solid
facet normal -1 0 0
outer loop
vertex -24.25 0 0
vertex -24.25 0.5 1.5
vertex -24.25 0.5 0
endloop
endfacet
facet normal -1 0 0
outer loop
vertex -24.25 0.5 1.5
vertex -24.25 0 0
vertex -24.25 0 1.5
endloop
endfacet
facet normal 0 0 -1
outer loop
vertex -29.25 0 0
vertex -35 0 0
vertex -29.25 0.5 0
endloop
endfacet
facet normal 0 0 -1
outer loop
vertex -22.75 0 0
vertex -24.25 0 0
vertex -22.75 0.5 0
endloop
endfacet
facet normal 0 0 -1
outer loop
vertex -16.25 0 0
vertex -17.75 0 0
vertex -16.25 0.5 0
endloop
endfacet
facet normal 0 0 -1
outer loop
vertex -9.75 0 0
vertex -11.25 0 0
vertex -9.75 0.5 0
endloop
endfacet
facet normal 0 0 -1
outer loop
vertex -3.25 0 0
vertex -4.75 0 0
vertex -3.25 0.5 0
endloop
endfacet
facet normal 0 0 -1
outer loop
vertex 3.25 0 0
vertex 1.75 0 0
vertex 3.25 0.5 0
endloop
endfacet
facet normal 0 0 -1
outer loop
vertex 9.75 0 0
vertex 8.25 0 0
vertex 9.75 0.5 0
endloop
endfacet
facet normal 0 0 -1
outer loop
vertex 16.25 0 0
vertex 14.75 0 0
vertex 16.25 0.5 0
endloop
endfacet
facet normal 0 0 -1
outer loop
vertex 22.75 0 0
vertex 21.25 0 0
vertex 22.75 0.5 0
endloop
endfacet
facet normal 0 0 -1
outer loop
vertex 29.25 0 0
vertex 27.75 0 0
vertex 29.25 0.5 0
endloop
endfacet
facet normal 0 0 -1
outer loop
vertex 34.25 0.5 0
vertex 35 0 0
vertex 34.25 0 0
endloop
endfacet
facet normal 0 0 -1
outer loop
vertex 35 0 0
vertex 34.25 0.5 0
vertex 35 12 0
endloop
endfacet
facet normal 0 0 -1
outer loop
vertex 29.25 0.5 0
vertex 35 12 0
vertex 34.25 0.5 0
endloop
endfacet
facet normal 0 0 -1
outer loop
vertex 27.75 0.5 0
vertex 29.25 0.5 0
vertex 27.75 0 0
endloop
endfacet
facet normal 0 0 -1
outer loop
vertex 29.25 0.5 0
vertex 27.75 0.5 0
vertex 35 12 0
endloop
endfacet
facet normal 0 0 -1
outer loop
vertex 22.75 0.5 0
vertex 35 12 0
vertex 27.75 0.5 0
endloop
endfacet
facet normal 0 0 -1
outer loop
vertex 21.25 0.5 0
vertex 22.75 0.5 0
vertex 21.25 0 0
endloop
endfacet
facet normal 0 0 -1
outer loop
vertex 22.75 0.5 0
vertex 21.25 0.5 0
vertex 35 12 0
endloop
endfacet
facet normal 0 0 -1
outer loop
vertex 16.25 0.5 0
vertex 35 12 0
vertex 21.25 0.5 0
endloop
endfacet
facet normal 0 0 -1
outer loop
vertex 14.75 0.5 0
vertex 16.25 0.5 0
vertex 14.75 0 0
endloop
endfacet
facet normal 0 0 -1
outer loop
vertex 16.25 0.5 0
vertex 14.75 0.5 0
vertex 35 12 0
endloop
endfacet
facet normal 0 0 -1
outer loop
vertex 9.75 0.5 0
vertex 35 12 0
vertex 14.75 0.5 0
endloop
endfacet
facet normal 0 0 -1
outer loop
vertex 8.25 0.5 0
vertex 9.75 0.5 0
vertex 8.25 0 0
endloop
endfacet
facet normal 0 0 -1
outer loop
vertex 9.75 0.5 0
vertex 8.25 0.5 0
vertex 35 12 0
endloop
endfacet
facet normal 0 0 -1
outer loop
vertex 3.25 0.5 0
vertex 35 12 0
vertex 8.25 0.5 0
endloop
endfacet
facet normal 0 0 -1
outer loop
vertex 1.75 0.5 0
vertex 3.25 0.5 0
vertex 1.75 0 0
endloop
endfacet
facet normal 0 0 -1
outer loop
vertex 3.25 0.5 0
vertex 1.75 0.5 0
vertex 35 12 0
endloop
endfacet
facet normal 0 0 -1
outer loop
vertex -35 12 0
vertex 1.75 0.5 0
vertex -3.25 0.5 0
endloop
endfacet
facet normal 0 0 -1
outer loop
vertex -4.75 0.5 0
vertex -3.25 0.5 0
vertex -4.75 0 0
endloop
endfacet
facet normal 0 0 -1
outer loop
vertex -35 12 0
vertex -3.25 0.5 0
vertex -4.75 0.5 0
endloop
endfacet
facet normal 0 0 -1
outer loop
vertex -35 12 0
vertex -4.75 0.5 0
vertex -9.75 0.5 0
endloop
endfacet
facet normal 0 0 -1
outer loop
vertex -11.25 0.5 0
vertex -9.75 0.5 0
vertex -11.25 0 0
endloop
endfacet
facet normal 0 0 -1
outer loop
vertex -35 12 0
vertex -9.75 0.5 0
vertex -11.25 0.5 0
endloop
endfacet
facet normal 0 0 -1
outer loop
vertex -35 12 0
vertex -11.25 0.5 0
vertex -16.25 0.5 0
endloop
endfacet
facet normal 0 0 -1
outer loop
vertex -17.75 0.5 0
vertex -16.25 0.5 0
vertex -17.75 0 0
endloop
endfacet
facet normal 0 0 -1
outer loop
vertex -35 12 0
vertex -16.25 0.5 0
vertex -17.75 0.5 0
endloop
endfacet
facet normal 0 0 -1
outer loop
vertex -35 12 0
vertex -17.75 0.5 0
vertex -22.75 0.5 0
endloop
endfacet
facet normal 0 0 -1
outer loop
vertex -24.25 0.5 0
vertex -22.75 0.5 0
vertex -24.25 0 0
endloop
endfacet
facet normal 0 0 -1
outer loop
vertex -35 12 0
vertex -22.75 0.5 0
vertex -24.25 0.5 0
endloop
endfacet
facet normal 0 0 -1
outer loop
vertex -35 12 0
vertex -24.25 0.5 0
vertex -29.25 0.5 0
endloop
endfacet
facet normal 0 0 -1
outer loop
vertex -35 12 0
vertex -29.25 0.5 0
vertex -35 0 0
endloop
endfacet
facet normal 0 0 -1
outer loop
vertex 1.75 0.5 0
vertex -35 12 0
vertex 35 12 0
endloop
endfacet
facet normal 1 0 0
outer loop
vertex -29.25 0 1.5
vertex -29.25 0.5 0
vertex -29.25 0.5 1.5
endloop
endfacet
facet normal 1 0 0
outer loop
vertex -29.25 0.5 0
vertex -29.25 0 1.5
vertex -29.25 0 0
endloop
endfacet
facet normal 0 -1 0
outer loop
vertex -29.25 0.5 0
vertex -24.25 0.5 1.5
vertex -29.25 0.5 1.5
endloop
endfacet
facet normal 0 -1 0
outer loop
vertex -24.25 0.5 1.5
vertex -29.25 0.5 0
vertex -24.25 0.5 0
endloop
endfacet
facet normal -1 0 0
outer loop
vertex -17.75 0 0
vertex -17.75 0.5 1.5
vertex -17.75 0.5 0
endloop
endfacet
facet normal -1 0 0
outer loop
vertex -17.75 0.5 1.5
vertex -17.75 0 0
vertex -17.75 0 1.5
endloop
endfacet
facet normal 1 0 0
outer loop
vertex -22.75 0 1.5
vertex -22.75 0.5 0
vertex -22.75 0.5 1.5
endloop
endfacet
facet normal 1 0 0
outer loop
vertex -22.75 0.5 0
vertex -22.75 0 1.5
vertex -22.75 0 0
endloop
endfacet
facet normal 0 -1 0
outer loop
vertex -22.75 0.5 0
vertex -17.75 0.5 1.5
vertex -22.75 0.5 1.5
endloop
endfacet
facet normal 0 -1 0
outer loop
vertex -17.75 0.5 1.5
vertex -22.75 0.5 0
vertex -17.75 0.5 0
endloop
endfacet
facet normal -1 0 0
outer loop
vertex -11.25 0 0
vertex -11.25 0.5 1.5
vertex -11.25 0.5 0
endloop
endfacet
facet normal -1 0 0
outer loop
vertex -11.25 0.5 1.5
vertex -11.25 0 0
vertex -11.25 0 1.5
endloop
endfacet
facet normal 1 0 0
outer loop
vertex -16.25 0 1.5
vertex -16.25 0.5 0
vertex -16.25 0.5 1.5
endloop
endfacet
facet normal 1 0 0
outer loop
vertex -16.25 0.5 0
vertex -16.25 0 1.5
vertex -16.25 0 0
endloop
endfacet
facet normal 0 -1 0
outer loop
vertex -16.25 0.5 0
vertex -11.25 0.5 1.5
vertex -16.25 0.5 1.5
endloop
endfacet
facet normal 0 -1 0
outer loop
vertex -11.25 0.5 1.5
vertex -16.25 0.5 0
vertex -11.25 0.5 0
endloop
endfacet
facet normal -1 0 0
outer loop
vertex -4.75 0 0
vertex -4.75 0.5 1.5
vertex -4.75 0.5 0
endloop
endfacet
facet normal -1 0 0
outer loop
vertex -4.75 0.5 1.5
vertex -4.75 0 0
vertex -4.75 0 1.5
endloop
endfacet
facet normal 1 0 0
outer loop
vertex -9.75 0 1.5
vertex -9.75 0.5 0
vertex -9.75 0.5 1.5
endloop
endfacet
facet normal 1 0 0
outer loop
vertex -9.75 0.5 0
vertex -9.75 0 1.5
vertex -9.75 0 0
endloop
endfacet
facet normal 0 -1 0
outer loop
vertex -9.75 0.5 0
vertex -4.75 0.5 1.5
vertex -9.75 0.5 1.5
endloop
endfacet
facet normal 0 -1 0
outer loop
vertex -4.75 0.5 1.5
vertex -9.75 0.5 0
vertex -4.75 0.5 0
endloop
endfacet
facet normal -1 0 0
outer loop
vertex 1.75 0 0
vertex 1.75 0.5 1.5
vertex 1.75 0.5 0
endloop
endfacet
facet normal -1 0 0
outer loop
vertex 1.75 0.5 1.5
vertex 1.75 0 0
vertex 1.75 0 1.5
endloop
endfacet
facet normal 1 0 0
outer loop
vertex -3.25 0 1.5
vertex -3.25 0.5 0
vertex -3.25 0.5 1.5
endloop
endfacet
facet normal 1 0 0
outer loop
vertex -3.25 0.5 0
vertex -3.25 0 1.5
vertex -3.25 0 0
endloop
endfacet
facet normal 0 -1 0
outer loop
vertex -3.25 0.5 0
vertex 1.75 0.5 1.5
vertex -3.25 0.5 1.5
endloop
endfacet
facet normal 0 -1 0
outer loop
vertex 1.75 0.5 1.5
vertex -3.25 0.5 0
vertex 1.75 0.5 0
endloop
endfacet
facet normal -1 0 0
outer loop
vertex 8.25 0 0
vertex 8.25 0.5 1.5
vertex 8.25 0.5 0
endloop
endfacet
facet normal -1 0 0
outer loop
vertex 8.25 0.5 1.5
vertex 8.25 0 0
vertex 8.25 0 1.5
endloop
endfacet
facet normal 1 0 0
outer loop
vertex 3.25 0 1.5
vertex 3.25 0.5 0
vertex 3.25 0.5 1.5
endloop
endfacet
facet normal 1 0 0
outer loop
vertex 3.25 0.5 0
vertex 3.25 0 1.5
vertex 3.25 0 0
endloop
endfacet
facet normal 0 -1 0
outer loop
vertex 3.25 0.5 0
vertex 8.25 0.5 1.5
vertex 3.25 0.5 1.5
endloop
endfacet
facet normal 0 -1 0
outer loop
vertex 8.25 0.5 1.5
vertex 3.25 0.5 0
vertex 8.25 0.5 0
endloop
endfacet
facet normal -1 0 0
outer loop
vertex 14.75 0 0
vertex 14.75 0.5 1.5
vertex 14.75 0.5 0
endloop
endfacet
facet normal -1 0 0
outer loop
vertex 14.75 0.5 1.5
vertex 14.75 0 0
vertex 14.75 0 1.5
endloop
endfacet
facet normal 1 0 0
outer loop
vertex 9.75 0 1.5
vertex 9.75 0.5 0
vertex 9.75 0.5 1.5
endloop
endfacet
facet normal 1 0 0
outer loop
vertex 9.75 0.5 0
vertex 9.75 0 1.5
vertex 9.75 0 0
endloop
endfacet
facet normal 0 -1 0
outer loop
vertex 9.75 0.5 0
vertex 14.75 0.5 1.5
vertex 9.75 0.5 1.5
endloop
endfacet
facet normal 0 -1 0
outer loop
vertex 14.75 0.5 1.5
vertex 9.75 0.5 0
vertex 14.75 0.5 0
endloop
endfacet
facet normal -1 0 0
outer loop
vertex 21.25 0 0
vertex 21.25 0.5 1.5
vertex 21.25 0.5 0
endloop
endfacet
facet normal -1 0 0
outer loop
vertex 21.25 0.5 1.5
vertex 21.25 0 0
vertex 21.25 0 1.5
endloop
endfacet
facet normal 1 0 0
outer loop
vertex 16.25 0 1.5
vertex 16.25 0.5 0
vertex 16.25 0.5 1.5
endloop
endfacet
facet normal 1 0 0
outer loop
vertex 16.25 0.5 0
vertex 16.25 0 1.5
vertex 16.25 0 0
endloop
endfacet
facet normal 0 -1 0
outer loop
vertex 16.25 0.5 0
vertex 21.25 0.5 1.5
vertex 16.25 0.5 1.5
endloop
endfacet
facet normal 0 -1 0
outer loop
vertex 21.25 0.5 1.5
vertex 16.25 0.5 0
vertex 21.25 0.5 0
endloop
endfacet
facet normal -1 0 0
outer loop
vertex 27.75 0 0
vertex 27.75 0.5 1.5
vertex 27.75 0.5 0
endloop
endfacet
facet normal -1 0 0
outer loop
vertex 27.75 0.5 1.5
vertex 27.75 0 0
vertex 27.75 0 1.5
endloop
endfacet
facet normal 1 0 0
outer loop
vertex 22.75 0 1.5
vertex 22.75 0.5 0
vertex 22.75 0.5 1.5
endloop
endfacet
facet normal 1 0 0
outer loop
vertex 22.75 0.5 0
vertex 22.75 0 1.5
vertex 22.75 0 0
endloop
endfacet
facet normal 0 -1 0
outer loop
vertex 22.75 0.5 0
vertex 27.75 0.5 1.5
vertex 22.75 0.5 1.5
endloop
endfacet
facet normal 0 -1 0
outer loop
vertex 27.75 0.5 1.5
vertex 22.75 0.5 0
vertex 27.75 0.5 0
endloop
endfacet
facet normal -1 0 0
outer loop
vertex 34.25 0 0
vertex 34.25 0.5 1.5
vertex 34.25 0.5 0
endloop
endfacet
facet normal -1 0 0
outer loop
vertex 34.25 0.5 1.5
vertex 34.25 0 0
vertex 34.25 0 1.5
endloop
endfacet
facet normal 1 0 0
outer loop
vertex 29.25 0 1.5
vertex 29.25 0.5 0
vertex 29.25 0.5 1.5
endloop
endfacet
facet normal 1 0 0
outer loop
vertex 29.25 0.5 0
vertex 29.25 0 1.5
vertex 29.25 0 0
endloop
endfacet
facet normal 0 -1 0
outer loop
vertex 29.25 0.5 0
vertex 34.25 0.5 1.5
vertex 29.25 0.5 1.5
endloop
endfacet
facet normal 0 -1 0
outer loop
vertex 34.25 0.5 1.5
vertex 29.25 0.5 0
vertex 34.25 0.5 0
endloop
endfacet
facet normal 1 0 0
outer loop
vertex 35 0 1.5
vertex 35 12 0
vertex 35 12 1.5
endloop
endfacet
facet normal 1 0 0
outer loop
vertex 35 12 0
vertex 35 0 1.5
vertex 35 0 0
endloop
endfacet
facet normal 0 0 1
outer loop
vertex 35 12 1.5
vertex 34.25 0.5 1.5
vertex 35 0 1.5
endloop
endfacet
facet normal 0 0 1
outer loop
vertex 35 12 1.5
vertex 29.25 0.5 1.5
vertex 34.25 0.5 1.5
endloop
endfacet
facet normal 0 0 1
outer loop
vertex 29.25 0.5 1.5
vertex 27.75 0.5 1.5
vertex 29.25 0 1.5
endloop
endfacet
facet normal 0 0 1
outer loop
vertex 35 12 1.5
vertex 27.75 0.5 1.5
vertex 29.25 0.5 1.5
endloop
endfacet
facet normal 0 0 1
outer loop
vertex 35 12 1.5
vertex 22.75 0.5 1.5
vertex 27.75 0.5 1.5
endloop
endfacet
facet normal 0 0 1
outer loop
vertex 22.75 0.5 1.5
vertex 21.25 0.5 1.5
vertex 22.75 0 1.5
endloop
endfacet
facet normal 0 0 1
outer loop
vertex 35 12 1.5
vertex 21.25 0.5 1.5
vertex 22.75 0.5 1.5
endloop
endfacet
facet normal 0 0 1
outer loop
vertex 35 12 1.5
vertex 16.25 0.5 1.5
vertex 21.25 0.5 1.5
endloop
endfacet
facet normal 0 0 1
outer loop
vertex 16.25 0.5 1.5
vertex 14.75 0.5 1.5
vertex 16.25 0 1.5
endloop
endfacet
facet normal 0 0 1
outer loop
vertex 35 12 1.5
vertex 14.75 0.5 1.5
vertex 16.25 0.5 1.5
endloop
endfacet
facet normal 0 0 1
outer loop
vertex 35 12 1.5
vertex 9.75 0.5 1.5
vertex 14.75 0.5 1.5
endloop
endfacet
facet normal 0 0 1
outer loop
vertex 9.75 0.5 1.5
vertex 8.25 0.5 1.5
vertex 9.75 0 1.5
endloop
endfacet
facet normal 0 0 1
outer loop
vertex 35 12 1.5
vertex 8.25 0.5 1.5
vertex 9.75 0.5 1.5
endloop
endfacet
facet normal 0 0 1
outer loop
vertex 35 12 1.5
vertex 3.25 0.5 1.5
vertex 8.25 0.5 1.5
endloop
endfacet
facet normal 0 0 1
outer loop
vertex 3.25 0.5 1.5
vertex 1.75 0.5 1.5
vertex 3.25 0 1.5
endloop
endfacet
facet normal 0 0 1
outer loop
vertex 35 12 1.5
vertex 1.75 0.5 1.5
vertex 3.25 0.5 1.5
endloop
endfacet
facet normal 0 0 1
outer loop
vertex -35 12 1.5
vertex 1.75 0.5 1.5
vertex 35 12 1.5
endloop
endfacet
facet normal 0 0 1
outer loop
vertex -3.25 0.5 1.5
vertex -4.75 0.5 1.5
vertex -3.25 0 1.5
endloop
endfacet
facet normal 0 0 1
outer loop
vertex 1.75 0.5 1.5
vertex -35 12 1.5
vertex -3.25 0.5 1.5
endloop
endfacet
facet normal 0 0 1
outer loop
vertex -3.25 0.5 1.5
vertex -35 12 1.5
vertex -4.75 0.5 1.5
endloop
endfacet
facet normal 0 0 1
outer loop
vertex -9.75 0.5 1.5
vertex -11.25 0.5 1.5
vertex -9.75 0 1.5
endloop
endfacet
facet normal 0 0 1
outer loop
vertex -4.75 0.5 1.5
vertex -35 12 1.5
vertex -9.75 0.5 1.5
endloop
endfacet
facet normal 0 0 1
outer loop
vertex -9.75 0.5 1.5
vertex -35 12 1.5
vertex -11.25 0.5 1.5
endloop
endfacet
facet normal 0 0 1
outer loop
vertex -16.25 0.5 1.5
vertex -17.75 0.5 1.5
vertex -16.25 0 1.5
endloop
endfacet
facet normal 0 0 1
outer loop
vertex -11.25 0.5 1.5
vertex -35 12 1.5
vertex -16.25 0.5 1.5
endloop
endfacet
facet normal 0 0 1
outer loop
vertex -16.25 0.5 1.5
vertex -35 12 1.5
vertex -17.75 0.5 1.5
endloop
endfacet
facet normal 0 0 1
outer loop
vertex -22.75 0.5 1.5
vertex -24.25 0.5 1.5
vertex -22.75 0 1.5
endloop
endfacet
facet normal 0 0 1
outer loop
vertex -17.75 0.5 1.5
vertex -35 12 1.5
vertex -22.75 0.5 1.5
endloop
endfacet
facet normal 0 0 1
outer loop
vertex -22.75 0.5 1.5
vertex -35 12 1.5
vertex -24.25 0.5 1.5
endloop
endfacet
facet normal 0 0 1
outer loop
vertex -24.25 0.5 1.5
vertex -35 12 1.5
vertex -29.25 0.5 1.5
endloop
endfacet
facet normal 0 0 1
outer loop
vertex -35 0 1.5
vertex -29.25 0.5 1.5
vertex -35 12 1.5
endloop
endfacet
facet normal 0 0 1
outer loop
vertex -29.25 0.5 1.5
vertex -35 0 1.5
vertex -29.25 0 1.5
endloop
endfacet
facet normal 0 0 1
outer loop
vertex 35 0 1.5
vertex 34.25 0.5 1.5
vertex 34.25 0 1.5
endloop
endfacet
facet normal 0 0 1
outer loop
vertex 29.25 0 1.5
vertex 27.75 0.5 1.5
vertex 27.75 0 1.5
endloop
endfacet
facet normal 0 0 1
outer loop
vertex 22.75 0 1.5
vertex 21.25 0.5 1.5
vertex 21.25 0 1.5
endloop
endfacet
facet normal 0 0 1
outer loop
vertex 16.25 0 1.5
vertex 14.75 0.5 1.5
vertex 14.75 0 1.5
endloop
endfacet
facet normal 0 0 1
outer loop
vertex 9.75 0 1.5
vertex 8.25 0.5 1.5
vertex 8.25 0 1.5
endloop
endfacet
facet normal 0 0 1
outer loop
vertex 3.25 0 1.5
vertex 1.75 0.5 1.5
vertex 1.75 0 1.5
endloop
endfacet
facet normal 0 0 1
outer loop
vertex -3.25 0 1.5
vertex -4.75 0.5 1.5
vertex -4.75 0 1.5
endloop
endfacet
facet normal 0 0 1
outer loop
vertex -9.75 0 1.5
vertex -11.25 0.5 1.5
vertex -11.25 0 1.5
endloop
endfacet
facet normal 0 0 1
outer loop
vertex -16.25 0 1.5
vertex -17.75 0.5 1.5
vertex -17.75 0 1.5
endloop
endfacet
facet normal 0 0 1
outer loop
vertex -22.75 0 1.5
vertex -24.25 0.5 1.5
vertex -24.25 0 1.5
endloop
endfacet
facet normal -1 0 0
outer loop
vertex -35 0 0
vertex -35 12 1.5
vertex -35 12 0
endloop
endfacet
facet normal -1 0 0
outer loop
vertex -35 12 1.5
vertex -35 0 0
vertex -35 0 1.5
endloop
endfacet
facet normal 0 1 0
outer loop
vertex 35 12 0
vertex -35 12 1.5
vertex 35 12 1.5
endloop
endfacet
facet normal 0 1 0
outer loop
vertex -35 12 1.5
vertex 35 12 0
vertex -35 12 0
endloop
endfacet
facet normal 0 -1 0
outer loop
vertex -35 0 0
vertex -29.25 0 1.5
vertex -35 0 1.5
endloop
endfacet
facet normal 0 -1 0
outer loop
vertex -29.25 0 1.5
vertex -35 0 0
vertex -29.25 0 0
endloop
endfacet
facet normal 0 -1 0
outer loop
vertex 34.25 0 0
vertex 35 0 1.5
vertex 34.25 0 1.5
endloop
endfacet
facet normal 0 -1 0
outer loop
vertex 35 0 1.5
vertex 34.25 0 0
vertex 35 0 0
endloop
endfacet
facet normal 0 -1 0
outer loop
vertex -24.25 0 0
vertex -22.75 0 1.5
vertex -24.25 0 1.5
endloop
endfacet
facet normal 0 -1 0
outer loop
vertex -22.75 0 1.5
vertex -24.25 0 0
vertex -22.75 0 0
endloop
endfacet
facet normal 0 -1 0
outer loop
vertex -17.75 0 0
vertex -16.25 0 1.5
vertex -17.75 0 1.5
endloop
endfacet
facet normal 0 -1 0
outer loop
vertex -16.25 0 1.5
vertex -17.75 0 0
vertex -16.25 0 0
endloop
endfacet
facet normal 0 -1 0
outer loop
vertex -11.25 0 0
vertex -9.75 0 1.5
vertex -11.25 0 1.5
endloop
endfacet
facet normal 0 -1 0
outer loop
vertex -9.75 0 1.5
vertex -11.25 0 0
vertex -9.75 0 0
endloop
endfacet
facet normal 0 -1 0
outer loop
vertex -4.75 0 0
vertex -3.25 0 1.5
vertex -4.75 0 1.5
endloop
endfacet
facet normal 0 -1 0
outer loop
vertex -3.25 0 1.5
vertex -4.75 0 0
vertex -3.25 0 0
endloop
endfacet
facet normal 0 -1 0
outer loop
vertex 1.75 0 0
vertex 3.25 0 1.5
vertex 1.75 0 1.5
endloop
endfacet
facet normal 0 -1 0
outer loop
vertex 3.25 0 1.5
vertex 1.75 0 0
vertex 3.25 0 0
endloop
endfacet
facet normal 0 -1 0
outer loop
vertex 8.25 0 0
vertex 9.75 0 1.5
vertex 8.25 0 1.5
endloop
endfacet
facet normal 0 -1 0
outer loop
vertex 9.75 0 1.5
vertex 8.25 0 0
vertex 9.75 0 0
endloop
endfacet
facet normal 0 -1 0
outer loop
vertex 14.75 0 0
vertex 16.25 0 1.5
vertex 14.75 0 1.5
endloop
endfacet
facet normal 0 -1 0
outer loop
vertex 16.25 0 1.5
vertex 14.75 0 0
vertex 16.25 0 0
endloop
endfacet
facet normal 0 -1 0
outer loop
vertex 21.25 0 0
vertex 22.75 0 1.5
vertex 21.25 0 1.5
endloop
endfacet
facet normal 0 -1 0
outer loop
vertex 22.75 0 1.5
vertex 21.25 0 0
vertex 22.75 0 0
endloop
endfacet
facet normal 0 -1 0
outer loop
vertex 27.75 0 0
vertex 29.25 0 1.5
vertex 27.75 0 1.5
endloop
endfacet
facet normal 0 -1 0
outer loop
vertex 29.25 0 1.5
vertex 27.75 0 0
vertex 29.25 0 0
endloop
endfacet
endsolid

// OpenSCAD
// 10-well agarose comb - printed lying flat
// Units: mm

plate_t      = 1.5;   // plate thickness (Z)
spine_l      = 70;    // spine length (X)
spine_w      = 12;    // spine width (Y)
teeth_n      = 10;    // number of teeth
teeth_w      = 5;     // tooth width (X)
teeth_l      = 12;    // tooth length (Y)
teeth_gap    = 1.5;   // gap between teeth (X)
overcut      = 0.5;   // cutter overshoot past faces

$fn = 64;

pitch = teeth_w + teeth_gap;
x0    = -(teeth_n - 1) * pitch / 2;   // first tooth centre X

difference() {
    // Spine
    translate([-spine_l / 2, 0, 0])
        cube([spine_l, spine_w, plate_t]);

    // Teeth hanging in -Y
    for (i = [0 : teeth_n - 1])
        translate([x0 + i * pitch, -teeth_l, 0])
            cube([teeth_w, teeth_l + overcut, plate_t + overcut]);
}
